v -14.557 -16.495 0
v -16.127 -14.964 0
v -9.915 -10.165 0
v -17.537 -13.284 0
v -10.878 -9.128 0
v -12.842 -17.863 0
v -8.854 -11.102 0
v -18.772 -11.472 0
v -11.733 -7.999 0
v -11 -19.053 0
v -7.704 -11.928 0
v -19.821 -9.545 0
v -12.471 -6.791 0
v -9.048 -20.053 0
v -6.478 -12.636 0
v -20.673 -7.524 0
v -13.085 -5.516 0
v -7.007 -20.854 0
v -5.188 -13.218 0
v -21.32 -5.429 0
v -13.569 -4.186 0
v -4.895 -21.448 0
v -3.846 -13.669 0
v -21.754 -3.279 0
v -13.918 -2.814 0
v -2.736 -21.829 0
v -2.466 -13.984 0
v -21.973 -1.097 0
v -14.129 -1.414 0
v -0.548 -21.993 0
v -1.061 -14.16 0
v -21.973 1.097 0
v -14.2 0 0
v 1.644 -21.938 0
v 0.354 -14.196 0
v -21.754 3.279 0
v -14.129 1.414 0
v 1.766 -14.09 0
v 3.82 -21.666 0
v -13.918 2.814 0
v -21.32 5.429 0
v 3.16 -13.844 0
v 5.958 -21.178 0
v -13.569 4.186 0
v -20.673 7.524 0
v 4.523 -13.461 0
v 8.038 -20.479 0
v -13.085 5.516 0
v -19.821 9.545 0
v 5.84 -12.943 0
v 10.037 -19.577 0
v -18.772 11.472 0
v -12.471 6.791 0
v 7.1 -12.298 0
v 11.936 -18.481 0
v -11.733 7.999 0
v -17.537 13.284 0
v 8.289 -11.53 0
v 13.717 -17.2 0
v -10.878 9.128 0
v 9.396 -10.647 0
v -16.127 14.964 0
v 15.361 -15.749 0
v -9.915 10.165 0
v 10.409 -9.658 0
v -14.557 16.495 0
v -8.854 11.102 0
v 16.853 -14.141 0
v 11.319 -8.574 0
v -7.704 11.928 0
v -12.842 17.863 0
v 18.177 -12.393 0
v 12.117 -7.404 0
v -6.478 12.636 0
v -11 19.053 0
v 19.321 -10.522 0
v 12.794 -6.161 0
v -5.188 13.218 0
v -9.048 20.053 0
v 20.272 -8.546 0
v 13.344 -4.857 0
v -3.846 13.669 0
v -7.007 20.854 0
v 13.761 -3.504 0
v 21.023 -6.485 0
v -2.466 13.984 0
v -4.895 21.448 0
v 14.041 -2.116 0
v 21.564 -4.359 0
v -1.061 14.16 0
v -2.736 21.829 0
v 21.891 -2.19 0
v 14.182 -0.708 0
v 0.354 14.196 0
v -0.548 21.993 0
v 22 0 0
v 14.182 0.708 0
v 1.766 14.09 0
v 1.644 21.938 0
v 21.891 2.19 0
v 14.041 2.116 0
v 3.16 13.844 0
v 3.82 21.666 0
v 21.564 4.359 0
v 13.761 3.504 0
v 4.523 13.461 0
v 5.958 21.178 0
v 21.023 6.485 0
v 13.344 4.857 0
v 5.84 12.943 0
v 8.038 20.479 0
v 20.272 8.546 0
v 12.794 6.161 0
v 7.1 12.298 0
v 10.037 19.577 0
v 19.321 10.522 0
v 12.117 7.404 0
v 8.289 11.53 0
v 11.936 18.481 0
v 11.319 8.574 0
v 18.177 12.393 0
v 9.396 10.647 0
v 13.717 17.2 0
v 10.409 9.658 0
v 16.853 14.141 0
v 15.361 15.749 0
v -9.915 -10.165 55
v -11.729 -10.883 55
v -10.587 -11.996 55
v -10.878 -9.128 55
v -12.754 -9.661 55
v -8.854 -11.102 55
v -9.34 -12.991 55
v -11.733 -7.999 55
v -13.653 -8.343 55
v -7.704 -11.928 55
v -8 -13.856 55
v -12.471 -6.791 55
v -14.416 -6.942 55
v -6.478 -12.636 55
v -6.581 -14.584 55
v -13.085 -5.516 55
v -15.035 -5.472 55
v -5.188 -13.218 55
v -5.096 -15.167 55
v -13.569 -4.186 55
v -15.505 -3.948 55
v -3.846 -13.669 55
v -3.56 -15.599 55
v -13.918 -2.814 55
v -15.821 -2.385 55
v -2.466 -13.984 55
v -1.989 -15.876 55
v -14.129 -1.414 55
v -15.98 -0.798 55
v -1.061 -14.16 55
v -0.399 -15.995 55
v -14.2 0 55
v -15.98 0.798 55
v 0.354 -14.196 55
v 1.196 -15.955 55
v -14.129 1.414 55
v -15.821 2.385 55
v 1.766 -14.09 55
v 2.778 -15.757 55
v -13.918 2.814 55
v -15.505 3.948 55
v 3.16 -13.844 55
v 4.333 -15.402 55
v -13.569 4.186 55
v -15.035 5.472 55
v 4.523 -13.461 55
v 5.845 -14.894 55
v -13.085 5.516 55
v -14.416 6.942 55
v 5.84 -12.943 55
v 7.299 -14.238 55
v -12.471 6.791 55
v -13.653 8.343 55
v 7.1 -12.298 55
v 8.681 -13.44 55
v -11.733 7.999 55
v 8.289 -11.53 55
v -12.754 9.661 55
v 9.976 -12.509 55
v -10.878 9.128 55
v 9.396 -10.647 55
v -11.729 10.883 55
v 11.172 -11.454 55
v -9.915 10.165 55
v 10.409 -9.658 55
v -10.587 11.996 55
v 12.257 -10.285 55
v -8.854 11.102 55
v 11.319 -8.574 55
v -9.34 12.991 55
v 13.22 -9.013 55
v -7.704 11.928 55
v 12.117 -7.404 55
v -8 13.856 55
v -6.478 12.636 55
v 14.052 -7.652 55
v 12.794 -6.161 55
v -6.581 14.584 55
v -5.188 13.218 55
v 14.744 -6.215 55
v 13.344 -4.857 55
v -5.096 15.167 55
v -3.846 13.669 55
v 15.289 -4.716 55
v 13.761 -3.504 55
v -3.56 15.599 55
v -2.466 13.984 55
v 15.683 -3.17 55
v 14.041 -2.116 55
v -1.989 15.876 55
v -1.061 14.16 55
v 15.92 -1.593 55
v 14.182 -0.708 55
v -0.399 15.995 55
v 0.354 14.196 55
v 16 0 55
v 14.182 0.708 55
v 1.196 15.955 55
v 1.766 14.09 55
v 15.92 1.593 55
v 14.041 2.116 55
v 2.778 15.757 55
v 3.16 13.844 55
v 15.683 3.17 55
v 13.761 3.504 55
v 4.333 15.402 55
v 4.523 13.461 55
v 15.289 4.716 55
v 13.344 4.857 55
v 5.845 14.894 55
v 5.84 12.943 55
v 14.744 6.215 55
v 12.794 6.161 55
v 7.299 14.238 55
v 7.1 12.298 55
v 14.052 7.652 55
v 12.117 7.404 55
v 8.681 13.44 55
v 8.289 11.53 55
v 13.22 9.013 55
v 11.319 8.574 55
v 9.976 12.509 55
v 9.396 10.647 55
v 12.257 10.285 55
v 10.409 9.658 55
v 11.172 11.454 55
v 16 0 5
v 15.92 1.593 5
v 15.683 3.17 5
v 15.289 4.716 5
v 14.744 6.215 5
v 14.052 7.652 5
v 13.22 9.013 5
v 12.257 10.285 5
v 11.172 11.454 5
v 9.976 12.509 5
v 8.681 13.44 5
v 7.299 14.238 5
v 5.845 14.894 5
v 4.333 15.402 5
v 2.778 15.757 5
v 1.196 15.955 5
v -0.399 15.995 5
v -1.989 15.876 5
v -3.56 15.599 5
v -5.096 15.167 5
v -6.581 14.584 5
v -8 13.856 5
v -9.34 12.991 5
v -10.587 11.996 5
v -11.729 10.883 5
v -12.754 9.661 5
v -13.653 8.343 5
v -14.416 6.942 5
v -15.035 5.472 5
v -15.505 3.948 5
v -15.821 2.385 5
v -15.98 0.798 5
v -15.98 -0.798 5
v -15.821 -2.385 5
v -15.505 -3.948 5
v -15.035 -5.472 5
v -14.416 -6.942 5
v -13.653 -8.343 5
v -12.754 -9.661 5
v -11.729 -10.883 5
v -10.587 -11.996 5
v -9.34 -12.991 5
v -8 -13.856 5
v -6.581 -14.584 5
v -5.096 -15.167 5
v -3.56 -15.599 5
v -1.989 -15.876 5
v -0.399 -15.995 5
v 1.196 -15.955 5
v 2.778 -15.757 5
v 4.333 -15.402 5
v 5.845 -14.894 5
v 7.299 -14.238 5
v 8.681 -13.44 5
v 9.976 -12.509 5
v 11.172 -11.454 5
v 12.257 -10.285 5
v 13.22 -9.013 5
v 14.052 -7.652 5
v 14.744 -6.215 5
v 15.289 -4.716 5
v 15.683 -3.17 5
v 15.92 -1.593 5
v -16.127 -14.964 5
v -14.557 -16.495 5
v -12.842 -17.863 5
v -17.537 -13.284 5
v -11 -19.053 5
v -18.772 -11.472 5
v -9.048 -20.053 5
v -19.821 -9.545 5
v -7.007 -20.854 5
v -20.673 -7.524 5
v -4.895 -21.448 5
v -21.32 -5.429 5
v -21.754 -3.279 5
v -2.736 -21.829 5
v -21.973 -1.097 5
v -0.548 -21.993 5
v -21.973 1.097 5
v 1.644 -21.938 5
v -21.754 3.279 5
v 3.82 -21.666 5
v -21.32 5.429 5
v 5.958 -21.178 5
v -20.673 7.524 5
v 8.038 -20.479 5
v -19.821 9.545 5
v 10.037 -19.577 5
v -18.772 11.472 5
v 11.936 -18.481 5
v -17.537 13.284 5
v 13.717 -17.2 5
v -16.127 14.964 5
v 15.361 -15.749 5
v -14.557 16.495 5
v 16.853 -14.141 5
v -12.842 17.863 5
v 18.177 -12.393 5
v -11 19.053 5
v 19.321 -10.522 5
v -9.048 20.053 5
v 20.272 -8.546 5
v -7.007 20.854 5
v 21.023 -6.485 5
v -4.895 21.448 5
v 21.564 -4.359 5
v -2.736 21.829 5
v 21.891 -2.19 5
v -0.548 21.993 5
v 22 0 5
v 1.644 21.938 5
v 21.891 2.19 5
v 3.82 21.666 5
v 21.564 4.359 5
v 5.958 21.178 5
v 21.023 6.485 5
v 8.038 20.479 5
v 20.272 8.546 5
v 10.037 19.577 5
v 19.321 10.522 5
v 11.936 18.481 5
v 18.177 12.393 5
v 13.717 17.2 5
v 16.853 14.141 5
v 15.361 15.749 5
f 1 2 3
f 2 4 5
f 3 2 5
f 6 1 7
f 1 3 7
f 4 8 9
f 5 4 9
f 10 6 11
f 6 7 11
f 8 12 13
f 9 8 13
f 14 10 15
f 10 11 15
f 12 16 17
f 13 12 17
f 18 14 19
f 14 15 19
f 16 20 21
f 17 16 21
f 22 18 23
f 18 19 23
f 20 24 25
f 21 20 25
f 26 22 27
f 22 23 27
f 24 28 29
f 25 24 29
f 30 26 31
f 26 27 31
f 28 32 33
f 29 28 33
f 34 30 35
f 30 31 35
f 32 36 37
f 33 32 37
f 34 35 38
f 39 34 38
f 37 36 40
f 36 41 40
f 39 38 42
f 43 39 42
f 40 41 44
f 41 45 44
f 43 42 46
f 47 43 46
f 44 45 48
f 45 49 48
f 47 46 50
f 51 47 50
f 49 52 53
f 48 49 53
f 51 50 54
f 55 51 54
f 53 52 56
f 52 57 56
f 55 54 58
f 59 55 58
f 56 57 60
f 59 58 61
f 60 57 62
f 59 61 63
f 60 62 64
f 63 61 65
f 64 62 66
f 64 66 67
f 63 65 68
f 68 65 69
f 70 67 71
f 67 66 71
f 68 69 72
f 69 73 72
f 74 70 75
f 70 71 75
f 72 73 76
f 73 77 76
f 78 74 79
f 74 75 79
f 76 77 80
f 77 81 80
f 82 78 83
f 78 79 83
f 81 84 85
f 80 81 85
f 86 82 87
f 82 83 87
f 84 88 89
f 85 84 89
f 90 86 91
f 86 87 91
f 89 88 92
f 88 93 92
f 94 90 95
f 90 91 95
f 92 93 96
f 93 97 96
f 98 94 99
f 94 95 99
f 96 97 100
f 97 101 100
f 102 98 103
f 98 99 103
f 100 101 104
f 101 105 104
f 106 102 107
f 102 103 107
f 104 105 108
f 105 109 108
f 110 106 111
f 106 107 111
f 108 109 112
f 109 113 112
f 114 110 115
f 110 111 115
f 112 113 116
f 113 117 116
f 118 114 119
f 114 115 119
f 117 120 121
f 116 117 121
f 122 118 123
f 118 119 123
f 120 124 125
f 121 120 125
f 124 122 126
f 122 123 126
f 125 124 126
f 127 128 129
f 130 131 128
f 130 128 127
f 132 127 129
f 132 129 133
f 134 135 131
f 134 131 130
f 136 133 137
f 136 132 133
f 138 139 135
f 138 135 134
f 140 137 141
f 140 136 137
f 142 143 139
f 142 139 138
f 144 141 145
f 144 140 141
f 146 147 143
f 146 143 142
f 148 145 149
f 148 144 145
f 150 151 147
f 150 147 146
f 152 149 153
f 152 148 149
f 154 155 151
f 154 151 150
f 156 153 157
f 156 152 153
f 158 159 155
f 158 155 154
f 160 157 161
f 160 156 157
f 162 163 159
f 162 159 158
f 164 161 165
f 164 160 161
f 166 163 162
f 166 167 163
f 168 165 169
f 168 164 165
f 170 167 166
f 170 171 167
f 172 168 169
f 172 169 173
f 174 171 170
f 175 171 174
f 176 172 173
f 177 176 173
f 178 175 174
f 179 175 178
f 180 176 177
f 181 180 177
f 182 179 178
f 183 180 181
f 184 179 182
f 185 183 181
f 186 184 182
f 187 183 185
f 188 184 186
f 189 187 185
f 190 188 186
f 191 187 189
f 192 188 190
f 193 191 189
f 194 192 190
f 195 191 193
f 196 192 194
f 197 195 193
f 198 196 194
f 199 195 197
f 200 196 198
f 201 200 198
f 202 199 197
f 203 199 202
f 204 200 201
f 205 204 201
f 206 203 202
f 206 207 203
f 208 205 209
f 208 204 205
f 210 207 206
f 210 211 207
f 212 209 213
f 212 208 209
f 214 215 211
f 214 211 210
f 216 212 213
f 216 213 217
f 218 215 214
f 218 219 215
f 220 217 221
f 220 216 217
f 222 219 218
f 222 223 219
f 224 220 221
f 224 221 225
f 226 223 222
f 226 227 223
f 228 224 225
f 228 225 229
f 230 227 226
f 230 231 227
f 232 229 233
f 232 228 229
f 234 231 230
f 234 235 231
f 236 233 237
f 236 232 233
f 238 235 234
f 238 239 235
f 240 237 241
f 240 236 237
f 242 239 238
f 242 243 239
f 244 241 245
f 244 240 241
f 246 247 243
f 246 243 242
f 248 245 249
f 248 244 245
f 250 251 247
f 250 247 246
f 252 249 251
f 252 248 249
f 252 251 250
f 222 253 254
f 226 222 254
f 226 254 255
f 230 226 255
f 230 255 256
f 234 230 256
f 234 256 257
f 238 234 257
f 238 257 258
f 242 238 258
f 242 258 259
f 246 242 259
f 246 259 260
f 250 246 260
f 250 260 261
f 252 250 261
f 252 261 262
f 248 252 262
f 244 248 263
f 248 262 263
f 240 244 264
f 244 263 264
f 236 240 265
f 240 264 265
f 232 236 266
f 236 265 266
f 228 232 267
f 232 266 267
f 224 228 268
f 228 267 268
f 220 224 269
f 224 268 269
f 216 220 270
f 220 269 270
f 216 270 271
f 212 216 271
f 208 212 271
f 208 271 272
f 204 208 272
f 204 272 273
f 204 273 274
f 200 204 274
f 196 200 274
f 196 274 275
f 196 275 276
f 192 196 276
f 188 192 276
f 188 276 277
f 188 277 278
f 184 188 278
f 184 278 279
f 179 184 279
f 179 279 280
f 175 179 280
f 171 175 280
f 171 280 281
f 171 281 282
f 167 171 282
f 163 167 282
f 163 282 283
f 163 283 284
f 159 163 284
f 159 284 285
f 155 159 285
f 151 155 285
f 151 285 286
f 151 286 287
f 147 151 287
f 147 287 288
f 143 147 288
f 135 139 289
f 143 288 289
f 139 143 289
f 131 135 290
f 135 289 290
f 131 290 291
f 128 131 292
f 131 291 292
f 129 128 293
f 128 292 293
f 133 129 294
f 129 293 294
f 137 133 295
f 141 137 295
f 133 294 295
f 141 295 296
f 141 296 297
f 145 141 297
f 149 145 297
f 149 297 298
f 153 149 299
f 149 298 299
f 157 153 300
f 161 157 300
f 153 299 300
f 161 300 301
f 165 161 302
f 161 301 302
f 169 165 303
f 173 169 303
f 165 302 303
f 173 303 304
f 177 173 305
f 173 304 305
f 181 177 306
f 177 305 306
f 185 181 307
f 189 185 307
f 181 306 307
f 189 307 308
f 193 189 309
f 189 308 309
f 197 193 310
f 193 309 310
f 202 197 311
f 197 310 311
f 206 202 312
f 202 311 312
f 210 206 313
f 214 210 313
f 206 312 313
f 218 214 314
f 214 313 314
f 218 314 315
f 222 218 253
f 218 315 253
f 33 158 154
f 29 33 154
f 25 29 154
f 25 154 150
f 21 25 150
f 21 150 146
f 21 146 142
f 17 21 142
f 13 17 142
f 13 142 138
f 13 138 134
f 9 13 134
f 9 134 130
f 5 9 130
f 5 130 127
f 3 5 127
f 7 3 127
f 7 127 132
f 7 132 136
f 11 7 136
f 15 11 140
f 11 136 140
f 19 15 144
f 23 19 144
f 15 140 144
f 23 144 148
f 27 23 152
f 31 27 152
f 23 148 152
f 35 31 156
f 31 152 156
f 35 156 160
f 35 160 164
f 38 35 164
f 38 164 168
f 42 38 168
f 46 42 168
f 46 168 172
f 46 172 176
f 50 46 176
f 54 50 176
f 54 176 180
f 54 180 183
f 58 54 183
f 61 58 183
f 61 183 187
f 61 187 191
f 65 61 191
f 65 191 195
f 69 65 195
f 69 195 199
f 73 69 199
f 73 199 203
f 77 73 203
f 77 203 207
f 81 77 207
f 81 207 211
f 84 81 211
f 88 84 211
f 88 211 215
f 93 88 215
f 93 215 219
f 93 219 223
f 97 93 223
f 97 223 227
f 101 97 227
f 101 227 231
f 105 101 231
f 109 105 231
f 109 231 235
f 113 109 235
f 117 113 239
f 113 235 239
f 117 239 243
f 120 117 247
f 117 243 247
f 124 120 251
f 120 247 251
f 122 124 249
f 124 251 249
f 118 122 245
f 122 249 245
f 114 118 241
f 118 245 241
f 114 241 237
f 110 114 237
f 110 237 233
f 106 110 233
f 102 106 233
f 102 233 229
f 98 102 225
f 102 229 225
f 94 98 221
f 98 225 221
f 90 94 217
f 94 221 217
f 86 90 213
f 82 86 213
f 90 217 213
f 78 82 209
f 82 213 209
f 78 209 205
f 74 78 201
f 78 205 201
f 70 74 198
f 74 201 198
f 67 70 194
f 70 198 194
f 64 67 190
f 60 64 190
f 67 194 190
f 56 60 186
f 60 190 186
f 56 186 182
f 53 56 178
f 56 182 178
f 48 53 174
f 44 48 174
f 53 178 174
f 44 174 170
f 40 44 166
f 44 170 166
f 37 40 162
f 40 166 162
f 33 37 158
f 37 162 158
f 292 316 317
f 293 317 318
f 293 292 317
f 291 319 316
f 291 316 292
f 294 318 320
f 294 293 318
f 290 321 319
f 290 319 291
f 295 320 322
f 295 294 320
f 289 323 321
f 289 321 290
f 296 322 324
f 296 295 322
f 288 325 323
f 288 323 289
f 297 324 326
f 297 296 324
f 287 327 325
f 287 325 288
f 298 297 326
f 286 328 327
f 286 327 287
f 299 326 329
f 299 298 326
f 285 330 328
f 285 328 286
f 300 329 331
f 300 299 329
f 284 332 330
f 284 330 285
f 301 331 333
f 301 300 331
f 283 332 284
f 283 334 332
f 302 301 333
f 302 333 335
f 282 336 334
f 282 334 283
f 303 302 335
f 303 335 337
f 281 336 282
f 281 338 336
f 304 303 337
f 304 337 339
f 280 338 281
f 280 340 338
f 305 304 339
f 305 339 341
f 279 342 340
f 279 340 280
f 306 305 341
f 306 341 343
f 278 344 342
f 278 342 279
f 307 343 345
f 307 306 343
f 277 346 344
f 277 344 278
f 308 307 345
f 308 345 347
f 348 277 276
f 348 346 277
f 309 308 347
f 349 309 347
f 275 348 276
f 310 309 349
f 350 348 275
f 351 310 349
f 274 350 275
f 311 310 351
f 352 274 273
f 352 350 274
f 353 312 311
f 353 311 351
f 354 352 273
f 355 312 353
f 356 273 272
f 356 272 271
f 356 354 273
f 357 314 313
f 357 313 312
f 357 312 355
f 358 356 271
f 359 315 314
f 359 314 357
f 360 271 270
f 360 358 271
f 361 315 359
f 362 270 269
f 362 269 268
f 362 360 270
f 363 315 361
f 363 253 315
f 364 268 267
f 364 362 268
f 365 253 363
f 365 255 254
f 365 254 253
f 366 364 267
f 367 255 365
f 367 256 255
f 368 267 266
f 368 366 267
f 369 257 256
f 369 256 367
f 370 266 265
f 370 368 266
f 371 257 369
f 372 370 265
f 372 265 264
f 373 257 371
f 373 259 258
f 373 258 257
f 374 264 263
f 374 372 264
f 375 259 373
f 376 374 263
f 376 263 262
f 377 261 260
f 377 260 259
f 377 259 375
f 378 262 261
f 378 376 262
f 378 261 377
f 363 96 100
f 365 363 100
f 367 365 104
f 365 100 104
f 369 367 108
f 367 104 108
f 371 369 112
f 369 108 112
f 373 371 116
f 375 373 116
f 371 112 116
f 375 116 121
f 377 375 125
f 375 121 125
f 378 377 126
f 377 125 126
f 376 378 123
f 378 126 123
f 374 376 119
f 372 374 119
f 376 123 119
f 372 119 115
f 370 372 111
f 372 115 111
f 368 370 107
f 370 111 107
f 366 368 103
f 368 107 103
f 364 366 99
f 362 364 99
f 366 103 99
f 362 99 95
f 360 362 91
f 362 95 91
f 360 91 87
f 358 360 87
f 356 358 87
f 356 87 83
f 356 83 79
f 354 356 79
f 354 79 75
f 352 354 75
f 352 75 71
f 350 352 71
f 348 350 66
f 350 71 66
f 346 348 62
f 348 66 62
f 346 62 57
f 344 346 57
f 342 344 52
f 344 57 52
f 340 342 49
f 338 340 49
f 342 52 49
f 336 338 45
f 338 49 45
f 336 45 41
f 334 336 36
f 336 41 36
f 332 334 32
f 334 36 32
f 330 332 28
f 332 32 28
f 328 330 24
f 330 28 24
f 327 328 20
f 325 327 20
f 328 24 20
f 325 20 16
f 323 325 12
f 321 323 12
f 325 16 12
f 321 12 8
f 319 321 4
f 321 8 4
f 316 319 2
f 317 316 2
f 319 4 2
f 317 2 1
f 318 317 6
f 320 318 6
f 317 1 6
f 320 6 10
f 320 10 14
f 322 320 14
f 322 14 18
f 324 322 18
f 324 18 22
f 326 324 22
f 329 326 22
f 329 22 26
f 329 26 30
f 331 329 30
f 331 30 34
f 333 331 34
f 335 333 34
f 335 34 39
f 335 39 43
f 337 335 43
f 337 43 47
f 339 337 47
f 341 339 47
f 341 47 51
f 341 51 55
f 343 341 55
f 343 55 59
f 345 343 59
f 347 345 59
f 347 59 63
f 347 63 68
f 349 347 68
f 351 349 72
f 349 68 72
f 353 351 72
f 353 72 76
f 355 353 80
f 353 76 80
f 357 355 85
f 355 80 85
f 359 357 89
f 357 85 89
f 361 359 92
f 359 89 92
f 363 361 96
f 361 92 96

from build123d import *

# Parameters (mm, degrees)
F0_R     = 16
F1_DEPTH = 55
F2_R     = 22
F3_DEPTH = 5
F5_D     = 28.4


with BuildPart() as f1:
    # F0 (on Top) → F1 (new body)
    with BuildSketch(Plane.XY):
        Circle(F0_R)
    extrude(amount=F1_DEPTH)

    # F2 (on Top) → F3 (join)
    with BuildSketch(Plane.XY):
        Circle(F2_R)
    extrude(amount=F3_DEPTH)

    # F5 (through all)
    with Locations(Plane(origin=(0, 0, 0), x_dir=(1, 0, 0), z_dir=(0, 0, -1))):
        with Locations((0, 0)):
            Hole(F5_D / 2)


solid = f1.part
